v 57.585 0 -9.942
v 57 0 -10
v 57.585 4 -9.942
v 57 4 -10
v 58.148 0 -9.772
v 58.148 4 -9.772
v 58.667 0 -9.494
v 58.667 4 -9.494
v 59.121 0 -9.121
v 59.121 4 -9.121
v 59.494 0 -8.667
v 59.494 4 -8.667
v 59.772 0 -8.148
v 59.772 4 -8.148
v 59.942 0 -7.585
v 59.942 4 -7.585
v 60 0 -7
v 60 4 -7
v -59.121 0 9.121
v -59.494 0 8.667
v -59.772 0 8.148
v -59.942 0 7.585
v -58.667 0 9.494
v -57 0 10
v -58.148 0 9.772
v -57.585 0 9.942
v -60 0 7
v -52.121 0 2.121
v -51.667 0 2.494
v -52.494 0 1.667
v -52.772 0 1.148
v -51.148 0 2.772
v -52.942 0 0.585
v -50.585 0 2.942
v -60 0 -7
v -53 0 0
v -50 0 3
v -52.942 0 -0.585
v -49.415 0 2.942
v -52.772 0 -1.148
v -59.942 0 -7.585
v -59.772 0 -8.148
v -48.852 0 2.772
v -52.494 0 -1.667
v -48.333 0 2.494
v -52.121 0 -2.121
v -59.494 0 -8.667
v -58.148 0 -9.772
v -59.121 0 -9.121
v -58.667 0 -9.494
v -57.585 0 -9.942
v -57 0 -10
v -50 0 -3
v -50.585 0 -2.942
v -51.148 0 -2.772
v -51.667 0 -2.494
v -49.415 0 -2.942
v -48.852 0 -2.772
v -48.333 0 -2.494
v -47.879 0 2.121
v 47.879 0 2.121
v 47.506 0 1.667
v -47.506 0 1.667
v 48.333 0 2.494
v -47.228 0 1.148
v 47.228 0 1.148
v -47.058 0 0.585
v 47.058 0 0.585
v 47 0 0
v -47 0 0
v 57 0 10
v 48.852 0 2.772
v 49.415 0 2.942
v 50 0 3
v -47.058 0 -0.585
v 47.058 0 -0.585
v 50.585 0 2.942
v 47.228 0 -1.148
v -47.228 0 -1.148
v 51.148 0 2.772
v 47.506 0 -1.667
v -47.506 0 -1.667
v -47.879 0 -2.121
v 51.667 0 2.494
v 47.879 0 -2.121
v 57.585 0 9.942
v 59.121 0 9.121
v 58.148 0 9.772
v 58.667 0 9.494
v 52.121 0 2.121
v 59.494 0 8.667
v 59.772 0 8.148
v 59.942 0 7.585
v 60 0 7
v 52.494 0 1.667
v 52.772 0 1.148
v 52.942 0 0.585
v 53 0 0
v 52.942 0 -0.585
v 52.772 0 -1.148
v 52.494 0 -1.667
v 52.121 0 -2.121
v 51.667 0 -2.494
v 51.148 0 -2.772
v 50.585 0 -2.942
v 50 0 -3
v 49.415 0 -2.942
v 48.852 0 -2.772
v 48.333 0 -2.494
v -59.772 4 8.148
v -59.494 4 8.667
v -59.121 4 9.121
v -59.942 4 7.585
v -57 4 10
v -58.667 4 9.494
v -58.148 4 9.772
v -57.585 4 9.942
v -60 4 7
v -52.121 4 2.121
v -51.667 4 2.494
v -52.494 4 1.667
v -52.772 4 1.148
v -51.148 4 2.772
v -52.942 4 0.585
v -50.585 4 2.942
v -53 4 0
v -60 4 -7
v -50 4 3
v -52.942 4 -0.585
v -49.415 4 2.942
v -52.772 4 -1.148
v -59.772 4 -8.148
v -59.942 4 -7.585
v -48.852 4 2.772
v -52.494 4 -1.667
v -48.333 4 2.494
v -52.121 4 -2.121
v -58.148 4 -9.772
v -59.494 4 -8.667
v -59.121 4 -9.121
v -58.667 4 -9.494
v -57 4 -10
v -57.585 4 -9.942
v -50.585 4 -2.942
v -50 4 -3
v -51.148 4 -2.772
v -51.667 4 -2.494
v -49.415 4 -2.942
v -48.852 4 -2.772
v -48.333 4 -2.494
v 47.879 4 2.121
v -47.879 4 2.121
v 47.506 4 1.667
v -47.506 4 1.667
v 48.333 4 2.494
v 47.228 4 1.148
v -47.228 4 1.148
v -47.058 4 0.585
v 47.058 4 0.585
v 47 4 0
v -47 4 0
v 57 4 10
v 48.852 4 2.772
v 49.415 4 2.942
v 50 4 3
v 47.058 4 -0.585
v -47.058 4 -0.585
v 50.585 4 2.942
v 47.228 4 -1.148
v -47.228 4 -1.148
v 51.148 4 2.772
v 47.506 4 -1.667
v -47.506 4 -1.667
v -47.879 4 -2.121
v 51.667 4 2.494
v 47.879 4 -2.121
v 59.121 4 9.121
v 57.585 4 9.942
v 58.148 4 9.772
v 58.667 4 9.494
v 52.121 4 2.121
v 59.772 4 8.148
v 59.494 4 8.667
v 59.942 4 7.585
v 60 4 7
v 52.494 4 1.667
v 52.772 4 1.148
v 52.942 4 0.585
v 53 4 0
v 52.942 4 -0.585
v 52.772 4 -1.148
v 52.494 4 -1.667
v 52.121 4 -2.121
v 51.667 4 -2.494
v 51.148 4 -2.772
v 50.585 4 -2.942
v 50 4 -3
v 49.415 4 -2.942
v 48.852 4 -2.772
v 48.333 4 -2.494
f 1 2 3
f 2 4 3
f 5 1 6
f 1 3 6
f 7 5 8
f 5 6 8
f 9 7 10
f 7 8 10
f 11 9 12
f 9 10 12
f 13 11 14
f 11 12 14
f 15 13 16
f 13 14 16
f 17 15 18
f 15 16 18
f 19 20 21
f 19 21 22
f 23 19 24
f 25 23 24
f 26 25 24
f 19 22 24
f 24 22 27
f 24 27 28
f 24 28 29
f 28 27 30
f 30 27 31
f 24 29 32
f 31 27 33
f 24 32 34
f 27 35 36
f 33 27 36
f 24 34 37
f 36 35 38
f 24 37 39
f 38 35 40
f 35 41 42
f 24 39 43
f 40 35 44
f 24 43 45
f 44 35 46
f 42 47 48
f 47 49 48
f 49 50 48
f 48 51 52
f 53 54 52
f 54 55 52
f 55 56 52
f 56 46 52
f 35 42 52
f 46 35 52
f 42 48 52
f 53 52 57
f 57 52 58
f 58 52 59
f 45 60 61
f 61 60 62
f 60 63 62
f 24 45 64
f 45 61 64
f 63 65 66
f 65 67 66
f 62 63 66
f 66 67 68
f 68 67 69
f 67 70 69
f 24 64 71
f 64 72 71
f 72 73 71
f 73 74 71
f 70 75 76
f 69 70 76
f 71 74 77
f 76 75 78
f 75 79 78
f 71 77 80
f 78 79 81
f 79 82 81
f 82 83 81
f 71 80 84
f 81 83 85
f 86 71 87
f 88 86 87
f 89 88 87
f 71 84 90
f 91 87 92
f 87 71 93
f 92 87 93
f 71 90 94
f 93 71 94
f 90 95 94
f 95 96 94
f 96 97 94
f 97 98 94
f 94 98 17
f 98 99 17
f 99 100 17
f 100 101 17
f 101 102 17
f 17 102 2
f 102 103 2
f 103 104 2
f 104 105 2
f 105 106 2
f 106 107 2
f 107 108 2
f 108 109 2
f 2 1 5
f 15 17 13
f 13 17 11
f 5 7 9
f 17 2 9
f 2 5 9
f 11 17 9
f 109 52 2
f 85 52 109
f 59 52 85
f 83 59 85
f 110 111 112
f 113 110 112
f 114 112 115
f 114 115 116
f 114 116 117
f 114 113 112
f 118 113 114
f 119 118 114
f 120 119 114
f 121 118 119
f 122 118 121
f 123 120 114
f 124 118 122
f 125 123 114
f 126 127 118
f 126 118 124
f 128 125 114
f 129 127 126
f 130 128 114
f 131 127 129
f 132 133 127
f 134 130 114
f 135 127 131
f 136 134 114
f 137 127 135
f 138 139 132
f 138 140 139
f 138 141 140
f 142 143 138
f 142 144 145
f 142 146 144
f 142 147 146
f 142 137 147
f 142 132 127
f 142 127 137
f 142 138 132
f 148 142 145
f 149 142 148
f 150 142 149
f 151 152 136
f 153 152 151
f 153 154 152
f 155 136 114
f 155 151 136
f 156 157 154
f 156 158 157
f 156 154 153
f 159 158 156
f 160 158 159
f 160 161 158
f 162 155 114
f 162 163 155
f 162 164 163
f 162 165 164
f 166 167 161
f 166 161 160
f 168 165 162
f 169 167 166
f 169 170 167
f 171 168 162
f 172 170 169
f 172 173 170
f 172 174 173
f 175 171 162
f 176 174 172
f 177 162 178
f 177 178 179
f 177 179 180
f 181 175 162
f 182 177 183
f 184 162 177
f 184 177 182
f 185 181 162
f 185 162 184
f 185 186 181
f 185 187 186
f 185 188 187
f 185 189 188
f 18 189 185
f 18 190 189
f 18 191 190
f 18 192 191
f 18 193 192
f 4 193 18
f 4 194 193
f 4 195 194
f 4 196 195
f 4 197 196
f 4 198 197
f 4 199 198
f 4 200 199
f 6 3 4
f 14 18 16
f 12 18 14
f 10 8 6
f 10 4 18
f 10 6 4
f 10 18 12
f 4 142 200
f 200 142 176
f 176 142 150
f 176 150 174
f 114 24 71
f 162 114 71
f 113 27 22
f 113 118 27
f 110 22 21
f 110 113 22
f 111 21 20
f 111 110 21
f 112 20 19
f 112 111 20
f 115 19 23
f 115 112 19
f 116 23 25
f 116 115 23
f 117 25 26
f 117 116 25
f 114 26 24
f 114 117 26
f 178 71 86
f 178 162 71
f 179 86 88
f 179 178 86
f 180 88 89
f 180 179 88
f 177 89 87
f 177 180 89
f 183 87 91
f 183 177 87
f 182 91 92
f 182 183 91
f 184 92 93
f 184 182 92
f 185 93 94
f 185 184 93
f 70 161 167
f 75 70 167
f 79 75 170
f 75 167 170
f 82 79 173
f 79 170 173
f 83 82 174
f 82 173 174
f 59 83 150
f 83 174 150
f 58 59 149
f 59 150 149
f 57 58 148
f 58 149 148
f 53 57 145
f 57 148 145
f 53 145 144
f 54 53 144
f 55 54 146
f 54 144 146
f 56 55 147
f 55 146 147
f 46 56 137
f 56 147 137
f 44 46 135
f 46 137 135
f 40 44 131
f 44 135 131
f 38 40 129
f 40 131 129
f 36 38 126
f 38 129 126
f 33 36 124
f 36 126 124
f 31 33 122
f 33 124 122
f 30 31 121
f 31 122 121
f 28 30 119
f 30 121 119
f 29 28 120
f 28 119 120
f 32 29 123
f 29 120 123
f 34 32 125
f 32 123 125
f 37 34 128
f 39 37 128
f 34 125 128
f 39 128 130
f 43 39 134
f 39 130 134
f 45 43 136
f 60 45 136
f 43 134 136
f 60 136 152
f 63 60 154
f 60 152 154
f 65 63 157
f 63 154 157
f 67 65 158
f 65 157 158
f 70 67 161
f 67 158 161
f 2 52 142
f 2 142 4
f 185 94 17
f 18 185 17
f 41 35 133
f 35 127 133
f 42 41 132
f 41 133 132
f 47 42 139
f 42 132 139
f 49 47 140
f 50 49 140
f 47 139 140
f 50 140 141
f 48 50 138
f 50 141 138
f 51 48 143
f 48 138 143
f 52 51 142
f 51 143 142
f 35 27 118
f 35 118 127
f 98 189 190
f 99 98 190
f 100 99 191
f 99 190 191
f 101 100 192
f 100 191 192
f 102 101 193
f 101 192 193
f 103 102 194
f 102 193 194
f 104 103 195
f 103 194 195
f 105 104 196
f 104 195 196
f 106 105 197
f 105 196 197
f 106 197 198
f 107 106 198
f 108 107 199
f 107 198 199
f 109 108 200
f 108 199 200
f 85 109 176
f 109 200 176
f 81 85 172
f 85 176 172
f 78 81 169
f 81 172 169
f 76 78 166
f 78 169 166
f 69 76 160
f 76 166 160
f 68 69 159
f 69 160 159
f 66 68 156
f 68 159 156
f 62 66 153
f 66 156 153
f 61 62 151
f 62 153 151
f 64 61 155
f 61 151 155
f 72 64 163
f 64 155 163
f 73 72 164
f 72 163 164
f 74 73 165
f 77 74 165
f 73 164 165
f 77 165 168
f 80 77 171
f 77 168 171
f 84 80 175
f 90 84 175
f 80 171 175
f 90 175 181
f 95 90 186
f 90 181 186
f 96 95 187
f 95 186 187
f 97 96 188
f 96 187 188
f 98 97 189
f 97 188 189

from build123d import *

# Parameters (mm, degrees)
SKETCH1_W           = 120
SKETCH1_H           = 20
BOSS_EXTRUDE1_DEPTH = 4
SKETCH2_R           = 3
CUT_EXTRUDE1_DEPTH  = 4
FILLET1_R           = 3


with BuildPart() as part:
    # Sketch1 → Boss-Extrude1 (new body)
    with BuildSketch(Plane(origin=(0, 0, 0), x_dir=(1, 0, 0), z_dir=(0, 1, 0))):
        Rectangle(SKETCH1_W, SKETCH1_H)
    extrude(amount=BOSS_EXTRUDE1_DEPTH)

    # Sketch2 → Cut-Extrude1 (cut)
    with BuildSketch(Plane(origin=(0, 4, 0), x_dir=(1, 0, 0), z_dir=(0, 1, 0))):
        with Locations((-50, 0)):
            Circle(SKETCH2_R)
        with Locations((50, 0)):
            Circle(SKETCH2_R)
    extrude(amount=-CUT_EXTRUDE1_DEPTH, mode=Mode.SUBTRACT)

    # Fillet1
    fillet1_edges = [part.edges().sort_by_distance(p)[0] for p in [
        (60, 2, 10),
        (-60, 2, 10),
        (-60, 2, -10),
        (60, 2, -10),
    ]]
    fillet(fillet1_edges, radius=FILLET1_R)


solid = part.part
